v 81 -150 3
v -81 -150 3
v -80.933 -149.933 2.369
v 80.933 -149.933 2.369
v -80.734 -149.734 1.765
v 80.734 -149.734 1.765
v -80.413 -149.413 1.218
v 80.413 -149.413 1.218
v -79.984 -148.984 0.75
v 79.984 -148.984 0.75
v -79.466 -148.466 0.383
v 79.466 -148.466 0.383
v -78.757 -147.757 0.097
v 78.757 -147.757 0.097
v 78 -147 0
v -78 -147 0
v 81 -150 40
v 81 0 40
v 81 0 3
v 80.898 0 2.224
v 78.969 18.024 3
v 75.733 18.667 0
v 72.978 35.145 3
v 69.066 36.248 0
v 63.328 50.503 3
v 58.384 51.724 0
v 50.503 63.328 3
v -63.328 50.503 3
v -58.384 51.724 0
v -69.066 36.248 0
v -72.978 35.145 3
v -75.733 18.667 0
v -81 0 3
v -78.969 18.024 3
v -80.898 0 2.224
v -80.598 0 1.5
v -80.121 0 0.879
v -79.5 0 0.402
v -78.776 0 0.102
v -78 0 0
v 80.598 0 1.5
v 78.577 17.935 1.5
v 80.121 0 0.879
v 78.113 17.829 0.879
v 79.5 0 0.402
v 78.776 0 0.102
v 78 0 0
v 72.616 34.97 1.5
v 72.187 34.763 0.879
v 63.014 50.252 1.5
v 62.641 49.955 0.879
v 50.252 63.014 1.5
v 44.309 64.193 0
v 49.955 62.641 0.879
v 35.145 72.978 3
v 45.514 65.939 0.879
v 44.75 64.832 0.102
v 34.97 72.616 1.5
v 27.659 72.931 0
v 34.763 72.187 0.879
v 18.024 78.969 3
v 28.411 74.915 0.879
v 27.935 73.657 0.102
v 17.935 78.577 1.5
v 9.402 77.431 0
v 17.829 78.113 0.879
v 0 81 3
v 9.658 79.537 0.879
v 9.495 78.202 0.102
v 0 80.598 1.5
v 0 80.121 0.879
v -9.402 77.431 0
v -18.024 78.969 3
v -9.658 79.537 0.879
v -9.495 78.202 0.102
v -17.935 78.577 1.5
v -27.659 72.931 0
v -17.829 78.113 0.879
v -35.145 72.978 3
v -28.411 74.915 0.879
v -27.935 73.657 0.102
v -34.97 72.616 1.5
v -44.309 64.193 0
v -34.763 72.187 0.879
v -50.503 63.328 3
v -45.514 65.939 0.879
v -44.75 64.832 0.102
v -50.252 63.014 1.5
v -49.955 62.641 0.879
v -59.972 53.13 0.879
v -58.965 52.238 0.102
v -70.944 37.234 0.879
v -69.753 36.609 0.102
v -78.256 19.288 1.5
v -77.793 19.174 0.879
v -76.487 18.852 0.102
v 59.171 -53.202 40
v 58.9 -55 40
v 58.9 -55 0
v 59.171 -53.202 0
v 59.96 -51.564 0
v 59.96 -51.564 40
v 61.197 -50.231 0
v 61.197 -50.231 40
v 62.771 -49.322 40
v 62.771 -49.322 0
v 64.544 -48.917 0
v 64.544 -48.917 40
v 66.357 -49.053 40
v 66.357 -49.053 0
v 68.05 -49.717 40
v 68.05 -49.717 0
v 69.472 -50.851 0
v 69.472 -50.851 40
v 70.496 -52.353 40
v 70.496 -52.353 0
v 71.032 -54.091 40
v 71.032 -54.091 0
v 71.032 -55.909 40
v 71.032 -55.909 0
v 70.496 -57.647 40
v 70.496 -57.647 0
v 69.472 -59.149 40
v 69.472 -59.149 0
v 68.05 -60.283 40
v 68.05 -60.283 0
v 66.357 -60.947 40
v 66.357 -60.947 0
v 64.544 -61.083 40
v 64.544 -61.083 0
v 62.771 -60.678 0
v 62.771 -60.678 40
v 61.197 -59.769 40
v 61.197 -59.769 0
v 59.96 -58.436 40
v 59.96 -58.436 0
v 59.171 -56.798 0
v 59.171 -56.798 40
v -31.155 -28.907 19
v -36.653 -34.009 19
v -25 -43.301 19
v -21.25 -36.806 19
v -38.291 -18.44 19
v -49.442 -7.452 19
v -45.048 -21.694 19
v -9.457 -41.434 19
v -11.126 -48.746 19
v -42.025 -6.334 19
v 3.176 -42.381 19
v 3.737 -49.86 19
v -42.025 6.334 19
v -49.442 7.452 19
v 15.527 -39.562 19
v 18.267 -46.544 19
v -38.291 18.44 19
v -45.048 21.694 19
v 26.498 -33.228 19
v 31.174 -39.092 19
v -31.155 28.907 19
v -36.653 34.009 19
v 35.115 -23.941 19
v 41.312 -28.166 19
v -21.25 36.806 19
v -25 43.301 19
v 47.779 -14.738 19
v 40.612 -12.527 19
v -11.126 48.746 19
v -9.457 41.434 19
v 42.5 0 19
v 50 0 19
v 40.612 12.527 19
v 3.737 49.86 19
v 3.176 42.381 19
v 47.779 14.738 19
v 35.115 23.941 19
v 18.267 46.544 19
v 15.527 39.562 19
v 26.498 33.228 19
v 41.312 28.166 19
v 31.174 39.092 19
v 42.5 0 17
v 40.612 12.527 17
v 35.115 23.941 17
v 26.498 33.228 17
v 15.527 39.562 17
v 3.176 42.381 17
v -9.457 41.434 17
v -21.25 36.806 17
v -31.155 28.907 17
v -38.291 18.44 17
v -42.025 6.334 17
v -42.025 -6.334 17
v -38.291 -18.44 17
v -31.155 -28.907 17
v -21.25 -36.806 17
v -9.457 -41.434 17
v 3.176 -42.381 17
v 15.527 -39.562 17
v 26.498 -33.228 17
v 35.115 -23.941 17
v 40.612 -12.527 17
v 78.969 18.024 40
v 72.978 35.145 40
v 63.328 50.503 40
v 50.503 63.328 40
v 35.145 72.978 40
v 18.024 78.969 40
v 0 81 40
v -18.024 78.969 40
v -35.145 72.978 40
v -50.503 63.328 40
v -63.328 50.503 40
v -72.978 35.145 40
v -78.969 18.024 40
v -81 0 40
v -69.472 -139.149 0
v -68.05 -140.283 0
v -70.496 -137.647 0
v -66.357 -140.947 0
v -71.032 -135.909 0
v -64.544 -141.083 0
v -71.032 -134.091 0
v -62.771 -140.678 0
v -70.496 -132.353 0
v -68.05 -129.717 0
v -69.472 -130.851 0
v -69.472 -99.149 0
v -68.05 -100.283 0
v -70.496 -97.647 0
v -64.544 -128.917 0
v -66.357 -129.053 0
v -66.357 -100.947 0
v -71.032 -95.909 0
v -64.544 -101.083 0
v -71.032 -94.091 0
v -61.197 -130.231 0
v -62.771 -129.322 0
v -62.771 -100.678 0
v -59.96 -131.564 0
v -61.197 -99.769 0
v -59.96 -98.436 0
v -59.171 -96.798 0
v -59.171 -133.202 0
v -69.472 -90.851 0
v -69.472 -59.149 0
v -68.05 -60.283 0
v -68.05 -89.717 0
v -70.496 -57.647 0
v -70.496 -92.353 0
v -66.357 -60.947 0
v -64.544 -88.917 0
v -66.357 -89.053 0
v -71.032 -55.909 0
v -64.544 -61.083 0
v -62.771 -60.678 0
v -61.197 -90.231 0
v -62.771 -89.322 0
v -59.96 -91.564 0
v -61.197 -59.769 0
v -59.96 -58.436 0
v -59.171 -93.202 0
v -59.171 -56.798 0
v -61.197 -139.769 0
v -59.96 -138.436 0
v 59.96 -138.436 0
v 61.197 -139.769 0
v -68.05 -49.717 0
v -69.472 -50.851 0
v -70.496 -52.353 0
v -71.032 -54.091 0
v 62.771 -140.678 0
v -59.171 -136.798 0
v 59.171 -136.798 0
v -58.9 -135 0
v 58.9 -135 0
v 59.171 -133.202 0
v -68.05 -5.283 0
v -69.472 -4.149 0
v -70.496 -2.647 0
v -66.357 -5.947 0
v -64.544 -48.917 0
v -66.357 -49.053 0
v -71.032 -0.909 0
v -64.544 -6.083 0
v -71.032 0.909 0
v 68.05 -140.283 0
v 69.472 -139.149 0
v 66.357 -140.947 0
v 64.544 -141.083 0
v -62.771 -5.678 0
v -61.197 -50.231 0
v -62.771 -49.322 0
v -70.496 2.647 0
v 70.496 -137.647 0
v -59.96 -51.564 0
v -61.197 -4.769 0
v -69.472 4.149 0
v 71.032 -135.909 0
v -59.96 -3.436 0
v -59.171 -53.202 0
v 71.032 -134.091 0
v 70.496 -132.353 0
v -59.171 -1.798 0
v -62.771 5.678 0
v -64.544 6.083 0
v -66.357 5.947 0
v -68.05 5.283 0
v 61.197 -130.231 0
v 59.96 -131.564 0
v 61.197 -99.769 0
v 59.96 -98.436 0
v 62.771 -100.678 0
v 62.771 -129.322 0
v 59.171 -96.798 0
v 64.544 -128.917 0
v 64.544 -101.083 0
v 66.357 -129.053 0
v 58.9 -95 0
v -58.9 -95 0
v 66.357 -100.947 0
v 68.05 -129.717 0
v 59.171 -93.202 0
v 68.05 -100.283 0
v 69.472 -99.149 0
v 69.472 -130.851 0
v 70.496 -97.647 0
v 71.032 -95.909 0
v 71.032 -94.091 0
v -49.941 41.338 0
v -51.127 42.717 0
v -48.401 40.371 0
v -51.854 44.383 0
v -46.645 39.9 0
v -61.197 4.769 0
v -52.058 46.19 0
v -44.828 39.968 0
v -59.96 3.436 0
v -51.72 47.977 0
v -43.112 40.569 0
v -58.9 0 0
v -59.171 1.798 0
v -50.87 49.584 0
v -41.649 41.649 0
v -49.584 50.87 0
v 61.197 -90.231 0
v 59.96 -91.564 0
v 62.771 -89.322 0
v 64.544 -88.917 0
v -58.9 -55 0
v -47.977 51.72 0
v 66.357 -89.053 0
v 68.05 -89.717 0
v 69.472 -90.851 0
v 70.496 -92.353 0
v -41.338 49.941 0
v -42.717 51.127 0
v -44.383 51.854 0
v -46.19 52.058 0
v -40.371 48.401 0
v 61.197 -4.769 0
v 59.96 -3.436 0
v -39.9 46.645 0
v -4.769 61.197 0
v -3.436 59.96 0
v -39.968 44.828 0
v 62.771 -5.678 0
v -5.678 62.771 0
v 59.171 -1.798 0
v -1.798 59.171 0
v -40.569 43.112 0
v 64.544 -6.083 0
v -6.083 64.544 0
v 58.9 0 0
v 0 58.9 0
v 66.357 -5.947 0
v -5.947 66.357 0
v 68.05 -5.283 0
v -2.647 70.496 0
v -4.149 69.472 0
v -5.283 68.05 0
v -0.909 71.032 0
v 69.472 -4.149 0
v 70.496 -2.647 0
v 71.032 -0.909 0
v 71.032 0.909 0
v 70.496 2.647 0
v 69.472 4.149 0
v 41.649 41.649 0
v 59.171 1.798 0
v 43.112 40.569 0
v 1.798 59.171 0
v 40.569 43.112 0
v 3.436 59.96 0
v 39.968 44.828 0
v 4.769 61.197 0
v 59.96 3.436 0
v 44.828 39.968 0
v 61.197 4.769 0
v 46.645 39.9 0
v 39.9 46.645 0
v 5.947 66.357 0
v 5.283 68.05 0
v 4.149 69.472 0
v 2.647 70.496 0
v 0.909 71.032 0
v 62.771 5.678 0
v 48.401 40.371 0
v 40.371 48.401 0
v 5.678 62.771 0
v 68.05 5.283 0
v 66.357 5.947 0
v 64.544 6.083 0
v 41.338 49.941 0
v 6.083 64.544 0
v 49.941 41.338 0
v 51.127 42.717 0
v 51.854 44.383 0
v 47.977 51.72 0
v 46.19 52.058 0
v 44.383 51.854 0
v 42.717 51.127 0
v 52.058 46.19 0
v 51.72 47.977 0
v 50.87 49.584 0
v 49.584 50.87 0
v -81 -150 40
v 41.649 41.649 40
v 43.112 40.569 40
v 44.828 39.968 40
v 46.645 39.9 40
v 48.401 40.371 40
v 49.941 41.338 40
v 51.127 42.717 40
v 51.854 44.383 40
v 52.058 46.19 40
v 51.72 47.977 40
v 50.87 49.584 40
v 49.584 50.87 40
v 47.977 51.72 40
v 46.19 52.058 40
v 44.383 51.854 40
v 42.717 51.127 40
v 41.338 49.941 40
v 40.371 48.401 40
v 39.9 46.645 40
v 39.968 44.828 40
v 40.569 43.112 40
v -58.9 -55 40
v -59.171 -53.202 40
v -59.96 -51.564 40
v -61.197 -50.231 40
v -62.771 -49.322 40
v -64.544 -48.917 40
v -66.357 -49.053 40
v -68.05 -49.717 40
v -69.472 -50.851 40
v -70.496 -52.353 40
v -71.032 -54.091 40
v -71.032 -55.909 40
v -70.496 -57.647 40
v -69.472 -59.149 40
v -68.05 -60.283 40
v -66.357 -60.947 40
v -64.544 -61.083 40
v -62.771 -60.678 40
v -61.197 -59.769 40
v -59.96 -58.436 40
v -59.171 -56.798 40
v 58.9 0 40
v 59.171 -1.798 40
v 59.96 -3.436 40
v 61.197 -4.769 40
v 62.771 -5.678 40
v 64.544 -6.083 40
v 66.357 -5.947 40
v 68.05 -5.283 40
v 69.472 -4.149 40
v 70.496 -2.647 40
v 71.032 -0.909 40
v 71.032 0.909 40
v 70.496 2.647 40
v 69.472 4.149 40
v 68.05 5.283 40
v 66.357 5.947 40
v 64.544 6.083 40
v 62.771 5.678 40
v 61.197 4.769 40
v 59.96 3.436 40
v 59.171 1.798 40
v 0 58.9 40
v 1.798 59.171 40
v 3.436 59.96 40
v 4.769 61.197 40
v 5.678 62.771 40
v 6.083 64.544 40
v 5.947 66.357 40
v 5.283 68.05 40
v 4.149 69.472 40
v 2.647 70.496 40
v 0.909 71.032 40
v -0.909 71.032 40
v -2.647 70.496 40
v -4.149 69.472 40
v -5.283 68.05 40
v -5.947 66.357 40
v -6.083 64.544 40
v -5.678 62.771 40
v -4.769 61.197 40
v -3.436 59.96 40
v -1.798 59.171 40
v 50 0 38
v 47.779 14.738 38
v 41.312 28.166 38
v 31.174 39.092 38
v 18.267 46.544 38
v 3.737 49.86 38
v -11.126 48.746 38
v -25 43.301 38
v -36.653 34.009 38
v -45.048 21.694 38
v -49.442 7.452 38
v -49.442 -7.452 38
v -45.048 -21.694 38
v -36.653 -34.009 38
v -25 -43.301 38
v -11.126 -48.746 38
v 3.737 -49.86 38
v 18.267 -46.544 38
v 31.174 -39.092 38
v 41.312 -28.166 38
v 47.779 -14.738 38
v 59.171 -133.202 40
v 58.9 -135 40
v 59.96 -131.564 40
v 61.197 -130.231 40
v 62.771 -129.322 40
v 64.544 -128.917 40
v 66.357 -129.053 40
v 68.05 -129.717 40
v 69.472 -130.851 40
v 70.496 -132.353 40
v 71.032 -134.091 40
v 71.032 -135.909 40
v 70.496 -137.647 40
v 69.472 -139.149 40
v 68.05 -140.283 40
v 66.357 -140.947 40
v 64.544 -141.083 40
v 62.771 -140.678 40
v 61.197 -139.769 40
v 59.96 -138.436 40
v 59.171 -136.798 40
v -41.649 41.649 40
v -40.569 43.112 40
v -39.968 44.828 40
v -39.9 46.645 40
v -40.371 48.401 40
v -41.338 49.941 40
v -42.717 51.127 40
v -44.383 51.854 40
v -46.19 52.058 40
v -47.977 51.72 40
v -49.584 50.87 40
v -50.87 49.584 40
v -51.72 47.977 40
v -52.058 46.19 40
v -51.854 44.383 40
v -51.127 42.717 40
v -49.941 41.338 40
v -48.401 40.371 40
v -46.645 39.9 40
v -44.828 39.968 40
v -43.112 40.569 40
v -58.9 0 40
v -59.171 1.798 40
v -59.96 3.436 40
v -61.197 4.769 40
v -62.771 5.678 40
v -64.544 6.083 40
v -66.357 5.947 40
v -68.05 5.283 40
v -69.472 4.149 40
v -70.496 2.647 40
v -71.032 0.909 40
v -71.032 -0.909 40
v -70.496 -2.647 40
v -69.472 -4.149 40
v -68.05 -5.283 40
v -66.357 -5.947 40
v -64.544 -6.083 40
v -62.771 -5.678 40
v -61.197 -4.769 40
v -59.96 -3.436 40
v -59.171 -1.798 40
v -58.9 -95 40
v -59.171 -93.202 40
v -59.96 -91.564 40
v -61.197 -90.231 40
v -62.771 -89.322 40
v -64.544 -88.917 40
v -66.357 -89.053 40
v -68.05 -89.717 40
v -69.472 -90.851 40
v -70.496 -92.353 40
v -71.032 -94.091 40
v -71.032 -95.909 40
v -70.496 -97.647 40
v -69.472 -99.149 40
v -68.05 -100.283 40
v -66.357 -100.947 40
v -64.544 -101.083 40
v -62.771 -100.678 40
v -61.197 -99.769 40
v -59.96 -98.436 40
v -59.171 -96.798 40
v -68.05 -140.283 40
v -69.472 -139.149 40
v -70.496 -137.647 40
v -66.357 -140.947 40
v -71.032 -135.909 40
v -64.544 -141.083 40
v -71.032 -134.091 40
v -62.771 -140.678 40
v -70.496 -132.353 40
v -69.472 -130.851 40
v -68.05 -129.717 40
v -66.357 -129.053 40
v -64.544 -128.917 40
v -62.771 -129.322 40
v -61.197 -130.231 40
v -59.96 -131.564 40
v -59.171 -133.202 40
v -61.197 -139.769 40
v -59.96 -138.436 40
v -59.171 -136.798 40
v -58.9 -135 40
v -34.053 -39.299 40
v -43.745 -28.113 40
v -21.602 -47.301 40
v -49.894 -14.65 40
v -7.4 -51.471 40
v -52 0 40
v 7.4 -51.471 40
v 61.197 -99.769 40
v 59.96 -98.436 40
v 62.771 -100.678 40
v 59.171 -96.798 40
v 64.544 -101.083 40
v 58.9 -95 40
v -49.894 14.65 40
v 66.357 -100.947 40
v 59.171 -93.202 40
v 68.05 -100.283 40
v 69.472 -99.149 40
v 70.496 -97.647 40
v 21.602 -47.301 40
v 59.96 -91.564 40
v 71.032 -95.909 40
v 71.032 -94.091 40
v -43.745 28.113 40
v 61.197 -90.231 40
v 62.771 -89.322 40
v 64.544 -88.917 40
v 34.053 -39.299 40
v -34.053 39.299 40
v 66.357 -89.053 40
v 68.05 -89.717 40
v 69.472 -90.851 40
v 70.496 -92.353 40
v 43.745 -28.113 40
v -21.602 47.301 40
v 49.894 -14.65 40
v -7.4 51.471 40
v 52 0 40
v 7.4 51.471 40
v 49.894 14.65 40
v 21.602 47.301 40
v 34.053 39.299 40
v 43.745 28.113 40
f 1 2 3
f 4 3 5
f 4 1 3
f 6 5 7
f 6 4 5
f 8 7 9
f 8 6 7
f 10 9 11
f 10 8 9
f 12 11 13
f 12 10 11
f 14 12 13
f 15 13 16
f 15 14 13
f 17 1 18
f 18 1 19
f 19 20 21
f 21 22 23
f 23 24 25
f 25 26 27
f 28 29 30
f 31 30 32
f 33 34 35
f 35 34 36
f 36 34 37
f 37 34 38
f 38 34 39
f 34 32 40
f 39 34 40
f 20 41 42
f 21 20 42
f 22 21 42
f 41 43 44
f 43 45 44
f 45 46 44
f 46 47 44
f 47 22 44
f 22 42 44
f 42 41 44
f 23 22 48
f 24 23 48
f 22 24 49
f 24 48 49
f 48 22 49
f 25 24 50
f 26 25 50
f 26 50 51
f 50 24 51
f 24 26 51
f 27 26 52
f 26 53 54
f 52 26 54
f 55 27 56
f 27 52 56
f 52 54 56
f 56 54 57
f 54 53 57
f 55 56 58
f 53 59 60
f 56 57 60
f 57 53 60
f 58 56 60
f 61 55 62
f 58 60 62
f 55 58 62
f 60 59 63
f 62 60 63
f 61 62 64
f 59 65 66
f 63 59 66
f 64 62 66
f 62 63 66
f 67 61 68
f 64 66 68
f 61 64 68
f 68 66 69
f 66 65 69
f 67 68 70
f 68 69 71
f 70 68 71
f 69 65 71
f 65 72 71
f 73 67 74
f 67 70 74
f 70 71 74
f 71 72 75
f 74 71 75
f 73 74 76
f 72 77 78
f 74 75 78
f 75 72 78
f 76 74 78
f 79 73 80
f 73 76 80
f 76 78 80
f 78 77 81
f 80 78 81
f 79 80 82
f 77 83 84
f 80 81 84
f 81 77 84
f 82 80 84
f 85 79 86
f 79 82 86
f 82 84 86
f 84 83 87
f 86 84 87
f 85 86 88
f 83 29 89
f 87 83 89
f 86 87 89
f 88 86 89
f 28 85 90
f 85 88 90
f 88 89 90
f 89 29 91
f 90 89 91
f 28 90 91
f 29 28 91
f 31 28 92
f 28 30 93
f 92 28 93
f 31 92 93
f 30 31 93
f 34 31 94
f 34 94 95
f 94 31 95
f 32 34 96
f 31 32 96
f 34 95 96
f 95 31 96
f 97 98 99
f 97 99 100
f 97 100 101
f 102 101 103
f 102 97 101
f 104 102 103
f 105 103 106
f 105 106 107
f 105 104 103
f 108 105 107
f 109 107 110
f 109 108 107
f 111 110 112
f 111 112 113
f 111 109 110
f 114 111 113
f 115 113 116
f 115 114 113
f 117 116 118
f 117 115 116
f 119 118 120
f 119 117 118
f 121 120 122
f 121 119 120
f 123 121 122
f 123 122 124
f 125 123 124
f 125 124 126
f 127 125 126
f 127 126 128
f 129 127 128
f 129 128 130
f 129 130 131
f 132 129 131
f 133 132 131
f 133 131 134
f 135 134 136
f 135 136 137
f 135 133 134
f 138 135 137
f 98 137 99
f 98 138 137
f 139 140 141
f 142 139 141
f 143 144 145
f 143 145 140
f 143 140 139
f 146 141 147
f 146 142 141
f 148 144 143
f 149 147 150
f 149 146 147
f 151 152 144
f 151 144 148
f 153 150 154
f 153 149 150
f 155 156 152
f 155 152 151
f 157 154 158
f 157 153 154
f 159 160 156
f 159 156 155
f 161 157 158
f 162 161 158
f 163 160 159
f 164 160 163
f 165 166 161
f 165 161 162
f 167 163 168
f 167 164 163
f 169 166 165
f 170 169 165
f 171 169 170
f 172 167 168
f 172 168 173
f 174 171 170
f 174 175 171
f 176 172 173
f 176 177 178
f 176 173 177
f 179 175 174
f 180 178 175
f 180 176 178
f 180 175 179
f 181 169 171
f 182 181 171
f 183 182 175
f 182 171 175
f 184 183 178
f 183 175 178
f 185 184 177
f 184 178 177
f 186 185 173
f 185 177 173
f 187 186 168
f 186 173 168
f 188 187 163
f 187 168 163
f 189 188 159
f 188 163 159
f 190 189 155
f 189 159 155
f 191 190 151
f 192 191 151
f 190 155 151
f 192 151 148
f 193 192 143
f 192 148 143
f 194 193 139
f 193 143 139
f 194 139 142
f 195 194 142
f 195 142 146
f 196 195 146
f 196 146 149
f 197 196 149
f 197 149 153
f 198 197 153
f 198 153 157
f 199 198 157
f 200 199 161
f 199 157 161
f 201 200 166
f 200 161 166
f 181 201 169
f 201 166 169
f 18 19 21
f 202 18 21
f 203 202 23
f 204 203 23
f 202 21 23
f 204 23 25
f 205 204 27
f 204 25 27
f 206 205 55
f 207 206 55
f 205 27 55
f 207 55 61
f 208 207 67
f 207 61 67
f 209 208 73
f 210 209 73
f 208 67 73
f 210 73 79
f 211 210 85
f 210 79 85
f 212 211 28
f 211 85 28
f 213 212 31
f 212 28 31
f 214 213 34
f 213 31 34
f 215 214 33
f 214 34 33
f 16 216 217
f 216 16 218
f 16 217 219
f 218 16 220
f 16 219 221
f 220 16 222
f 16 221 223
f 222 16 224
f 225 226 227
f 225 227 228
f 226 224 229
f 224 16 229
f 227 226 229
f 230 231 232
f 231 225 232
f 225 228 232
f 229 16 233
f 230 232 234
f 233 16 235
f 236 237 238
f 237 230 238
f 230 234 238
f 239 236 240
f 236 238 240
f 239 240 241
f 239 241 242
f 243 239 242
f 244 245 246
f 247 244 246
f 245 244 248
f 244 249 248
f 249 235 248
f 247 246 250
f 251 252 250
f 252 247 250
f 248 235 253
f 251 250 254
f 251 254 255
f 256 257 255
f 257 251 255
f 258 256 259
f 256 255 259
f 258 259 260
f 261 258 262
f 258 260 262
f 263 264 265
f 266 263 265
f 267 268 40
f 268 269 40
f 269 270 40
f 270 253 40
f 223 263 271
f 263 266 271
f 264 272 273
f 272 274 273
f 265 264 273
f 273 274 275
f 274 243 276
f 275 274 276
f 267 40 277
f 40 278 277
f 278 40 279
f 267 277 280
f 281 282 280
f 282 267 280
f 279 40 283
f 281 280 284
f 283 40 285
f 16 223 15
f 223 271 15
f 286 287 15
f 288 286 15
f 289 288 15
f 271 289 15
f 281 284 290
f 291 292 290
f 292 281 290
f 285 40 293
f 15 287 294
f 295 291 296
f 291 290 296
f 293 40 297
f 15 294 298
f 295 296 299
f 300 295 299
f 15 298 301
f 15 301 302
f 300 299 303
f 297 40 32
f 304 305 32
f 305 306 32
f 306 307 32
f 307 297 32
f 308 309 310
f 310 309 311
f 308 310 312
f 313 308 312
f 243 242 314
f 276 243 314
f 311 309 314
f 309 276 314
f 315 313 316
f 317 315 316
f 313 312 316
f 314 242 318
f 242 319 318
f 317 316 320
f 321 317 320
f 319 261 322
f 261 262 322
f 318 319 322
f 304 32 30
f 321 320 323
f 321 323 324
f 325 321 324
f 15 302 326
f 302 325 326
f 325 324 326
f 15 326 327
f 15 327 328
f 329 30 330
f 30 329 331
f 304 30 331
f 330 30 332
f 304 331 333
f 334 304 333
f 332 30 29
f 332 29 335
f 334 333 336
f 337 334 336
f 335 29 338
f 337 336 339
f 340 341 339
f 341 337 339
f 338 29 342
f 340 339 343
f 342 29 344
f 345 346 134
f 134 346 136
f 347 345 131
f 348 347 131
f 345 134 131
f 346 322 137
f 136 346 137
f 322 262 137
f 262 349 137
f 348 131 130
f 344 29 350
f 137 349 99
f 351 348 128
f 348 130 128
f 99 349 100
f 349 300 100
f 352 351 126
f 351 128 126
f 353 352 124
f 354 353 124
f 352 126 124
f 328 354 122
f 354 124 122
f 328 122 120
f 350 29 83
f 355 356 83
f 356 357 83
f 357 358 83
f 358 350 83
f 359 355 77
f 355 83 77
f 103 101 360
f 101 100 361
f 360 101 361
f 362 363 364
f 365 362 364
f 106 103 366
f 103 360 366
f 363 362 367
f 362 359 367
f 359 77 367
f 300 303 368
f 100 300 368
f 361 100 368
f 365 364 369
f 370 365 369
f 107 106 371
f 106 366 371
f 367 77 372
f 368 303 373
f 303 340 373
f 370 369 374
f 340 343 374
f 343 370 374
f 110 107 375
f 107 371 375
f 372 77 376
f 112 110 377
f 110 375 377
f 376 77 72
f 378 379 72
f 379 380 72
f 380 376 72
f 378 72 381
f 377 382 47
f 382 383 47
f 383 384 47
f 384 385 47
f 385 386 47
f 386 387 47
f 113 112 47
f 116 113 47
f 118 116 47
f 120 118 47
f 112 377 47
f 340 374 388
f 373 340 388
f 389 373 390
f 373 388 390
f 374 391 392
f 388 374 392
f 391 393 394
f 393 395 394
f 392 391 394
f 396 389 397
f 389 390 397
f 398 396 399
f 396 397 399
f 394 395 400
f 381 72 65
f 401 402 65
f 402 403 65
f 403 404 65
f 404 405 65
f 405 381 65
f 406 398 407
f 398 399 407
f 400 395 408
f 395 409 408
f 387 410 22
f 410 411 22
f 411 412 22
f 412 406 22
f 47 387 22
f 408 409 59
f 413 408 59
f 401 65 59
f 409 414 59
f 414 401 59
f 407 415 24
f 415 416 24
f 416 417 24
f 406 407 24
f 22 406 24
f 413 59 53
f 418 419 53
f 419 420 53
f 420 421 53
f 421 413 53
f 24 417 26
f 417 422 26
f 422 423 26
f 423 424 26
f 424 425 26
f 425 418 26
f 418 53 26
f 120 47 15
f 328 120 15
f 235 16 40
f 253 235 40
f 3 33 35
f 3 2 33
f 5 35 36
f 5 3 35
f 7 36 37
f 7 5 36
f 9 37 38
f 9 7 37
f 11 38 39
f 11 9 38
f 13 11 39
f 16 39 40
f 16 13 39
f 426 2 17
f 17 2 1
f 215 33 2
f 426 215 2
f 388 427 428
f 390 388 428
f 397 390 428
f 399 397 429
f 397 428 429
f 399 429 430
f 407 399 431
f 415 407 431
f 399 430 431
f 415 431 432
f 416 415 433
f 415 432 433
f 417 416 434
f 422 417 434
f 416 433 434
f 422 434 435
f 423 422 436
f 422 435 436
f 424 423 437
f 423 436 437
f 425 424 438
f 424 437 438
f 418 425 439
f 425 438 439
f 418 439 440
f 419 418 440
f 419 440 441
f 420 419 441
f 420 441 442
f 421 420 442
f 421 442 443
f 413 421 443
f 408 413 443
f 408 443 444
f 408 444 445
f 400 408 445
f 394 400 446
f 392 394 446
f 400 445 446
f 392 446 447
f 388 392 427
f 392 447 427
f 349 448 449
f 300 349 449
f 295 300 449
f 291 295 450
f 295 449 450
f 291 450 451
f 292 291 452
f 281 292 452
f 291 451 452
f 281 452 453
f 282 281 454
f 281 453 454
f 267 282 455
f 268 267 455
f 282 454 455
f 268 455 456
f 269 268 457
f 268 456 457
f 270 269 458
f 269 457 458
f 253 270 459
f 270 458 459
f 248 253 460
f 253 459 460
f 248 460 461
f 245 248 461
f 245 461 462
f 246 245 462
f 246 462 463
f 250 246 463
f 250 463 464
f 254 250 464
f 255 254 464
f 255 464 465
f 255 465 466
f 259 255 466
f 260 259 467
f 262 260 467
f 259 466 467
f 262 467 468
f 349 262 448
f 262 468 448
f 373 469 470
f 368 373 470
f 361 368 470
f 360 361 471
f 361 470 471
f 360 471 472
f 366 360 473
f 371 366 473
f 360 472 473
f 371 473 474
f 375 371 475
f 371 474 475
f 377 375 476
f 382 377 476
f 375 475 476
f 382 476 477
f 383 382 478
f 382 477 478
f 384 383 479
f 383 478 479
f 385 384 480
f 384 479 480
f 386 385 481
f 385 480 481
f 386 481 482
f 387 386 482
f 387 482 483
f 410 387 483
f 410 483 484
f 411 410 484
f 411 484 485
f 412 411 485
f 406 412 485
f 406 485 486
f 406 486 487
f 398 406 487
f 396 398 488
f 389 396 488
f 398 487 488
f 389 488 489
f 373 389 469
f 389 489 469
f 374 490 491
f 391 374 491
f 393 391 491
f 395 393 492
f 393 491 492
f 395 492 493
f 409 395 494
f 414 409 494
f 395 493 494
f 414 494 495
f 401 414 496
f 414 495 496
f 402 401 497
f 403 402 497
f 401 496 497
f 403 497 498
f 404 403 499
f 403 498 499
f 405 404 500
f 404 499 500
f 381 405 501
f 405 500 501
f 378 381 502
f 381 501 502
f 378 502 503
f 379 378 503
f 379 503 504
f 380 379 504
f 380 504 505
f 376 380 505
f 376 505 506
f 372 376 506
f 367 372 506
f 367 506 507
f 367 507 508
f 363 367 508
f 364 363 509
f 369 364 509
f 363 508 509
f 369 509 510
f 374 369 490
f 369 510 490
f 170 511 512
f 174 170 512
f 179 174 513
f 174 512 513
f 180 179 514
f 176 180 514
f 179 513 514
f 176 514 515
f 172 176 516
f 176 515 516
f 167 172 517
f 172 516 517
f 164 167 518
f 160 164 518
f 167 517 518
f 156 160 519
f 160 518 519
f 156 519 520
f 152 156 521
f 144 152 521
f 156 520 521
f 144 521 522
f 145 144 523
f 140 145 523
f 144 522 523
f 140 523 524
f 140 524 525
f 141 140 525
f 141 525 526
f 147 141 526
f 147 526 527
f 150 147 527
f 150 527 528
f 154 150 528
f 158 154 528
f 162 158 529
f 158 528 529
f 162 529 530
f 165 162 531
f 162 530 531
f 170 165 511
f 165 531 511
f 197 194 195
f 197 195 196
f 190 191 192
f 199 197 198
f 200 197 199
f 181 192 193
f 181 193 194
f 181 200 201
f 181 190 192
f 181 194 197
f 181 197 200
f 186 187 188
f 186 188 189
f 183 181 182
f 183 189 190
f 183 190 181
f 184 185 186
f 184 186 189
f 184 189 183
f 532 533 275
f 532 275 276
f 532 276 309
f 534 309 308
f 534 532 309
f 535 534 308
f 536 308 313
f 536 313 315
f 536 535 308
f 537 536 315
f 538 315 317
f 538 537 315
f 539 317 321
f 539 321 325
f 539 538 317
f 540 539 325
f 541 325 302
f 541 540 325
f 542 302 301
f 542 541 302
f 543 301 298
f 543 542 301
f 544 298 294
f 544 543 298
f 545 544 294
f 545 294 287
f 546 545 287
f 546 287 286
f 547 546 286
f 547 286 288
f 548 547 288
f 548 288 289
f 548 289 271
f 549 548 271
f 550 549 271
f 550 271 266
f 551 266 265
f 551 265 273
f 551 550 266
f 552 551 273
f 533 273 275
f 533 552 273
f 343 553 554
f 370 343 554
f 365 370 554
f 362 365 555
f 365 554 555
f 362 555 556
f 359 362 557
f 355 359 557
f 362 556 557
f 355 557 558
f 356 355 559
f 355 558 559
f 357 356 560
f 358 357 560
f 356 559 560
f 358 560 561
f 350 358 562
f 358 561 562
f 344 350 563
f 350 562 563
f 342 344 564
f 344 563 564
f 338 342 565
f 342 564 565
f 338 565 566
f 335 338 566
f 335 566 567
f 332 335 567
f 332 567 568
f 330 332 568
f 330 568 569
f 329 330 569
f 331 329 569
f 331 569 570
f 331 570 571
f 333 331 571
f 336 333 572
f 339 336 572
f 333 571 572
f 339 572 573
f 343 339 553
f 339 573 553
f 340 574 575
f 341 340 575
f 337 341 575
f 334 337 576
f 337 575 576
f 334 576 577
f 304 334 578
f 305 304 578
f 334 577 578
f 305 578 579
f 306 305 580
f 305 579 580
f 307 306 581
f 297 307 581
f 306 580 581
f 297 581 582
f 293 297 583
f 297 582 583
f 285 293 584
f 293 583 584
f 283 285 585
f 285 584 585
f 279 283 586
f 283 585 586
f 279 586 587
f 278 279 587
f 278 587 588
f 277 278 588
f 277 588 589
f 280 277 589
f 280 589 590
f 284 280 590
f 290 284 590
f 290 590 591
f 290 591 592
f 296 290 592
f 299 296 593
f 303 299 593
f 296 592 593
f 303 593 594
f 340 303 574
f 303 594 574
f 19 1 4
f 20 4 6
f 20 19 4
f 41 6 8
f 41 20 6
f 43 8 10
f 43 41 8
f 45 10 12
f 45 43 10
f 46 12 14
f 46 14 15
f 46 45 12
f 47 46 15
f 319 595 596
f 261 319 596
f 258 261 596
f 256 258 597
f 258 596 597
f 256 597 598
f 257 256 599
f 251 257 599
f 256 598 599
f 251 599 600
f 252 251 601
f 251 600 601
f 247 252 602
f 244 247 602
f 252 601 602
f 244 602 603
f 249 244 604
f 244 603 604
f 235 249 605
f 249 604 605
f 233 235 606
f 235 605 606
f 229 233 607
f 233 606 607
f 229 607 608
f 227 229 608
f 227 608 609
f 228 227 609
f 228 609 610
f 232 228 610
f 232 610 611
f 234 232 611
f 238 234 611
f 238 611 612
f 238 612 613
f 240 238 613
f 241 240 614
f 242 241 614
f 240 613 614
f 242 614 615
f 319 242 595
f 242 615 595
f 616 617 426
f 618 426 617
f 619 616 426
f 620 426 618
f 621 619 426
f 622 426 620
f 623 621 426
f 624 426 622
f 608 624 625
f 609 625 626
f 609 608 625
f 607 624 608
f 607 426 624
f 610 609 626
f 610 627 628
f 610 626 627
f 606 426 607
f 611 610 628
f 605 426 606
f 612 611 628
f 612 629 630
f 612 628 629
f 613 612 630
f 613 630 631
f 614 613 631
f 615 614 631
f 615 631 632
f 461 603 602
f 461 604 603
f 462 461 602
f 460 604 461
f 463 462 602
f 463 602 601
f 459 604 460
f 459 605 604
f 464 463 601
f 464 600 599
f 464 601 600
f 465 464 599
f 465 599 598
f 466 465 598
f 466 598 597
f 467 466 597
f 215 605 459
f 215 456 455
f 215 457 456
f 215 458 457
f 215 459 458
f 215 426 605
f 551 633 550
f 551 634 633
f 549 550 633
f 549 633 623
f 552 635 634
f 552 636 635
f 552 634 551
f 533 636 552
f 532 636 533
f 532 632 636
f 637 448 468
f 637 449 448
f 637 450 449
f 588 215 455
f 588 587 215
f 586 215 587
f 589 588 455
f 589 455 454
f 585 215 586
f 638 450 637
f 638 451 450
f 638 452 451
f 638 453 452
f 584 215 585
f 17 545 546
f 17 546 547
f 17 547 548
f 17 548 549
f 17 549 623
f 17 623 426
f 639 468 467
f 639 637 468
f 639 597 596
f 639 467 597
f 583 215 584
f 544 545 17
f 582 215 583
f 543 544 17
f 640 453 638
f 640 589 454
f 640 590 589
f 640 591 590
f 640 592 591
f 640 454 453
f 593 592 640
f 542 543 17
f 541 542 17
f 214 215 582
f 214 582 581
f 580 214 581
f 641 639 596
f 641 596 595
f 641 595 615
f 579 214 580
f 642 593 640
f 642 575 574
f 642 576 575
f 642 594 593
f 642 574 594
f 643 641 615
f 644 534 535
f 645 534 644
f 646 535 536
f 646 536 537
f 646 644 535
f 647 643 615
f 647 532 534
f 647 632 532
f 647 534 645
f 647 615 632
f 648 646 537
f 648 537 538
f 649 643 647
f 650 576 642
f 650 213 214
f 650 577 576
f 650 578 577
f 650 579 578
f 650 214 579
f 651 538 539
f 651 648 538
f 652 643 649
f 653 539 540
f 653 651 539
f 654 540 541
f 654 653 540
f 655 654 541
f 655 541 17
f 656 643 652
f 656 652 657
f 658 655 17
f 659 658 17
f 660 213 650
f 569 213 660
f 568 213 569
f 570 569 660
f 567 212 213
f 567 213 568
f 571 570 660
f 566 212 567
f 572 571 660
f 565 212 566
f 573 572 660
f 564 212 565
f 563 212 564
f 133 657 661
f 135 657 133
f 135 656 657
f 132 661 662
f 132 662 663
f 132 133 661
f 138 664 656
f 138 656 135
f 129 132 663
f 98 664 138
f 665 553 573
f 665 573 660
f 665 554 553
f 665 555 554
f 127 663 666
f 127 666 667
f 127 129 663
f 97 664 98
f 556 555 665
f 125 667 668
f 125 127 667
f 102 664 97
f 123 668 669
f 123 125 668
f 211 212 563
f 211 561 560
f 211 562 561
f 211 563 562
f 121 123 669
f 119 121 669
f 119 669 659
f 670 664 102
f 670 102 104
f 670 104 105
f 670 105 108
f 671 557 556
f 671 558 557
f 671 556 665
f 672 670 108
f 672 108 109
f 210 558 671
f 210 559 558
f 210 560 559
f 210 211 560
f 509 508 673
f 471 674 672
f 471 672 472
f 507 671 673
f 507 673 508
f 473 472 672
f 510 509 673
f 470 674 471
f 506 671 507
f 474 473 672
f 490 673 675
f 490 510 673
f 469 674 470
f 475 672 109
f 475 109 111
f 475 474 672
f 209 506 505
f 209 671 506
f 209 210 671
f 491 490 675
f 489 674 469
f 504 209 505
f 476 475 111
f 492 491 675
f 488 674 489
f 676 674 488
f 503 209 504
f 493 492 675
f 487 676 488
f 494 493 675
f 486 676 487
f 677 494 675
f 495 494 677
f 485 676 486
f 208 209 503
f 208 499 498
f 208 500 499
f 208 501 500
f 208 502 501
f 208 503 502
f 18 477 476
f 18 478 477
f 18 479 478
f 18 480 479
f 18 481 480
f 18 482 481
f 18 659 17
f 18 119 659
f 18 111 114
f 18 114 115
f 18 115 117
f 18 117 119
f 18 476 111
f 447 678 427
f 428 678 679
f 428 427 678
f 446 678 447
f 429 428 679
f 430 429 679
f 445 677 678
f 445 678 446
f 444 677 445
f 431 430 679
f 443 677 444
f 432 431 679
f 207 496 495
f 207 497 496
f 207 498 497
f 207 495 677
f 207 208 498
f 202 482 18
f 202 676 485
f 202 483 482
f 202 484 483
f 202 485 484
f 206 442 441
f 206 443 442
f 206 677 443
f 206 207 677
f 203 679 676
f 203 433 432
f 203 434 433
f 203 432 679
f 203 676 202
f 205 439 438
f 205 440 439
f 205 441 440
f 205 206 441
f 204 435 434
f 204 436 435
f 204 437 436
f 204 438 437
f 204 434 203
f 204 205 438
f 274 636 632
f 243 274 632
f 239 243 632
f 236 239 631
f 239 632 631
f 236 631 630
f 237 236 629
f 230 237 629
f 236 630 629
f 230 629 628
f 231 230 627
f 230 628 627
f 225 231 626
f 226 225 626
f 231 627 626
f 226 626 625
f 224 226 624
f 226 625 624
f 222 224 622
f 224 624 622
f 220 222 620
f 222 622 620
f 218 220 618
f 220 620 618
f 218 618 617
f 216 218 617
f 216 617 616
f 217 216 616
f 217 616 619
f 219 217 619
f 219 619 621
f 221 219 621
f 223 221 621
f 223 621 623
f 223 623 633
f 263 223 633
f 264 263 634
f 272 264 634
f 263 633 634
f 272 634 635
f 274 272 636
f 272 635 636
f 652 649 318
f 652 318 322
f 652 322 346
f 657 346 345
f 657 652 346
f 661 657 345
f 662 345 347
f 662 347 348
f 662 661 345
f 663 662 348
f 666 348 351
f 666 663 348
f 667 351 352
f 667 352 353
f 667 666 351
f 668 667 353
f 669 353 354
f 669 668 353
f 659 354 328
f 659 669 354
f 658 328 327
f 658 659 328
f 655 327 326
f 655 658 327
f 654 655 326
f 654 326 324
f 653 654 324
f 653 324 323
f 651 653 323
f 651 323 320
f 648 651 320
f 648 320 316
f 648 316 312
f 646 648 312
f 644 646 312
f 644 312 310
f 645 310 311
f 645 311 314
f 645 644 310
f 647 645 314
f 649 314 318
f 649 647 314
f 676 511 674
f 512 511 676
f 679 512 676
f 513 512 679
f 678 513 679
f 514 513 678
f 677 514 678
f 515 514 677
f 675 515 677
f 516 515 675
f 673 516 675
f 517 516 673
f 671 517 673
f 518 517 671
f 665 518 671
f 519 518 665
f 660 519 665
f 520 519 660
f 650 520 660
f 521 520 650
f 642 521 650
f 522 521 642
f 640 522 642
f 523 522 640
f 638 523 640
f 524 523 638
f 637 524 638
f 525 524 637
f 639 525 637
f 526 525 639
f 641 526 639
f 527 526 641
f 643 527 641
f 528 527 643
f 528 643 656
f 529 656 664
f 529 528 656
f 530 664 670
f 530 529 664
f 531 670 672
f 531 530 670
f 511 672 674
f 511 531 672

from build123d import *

# Parameters (mm, degrees)
BOSS_EXTRUDE1_DEPTH = 40
SKETCH2_R           = 6.1
CUT_EXTRUDE1_DEPTH  = 40
CIRPATTERN1_COUNT   = 5
CIRPATTERN1_ANGLE   = 180
SKETCH3_R           = 6.1
CUT_EXTRUDE2_DEPTH  = 40
SKETCH5_R           = 50
CUT_EXTRUDE3_DEPTH  = 21
SKETCH6_R           = 42.5
CUT_EXTRUDE4_DEPTH  = 2
CHAMFER1_SIZE       = 2
FILLET1_R           = 3


with BuildPart() as part:
    # Sketch1 → Boss-Extrude1 (new body)
    with BuildSketch(Plane.XY):
        with BuildLine():
            Line((-81, 0), (-81, -150))
            Line((-81, -150), (81, -150))
            Line((81, -150), (81, 0))
            ThreePointArc((81, 0), (0, 81), (-81, 0))
        make_face()
    extrude(amount=BOSS_EXTRUDE1_DEPTH)

    # Sketch2 → Cut-Extrude1 (cut)
    with BuildSketch(Plane.XY.offset(40)):
        with Locations((-65, 0)):
            Circle(SKETCH2_R)
    cut_extrude1 = extrude(amount=-CUT_EXTRUDE1_DEPTH, mode=Mode.SUBTRACT)

    # CirPattern1: Cut-Extrude1 ×5 about axis
    cirpattern1_axis = Axis((0, 0, 0), (0, 0, -1))
    for i in range(1, CIRPATTERN1_COUNT):
        add(cut_extrude1.rotate(cirpattern1_axis, i * CIRPATTERN1_ANGLE / (CIRPATTERN1_COUNT - 1)), mode=Mode.SUBTRACT)

    # Sketch3 → Cut-Extrude2 (cut)
    with BuildSketch(Plane.XY.offset(40)):
        with Locations((-65, -135)):
            Circle(SKETCH3_R)
        with Locations((-65, -95)):
            Circle(SKETCH3_R)
        with Locations((-65, -55)):
            Circle(SKETCH3_R)
    cut_extrude2 = extrude(amount=-CUT_EXTRUDE2_DEPTH, mode=Mode.SUBTRACT)

    # Mirror1: Cut-Extrude2 across plane
    add(cut_extrude2.mirror(Plane(origin=(0, 0, 0), x_dir=(0, 0, 1), z_dir=(1, 0, 0))), mode=Mode.SUBTRACT)

    # Sketch5 → Cut-Extrude3 (cut)
    with BuildSketch(Plane.XY.offset(40)):
        Circle(SKETCH5_R)
    extrude(amount=-CUT_EXTRUDE3_DEPTH, mode=Mode.SUBTRACT)

    # Sketch6 → Cut-Extrude4 (cut)
    with BuildSketch(Plane.XY.offset(19)):
        Circle(SKETCH6_R)
    extrude(amount=-CUT_EXTRUDE4_DEPTH, mode=Mode.SUBTRACT)

    # Chamfer1
    chamfer1_edges = [part.edges().sort_by_distance(p)[0] for p in [
        (-50, 0, 40),
    ]]
    chamfer(chamfer1_edges, length=CHAMFER1_SIZE)

    # Fillet1
    fillet1_edges = [part.edges().sort_by_distance(p)[0] for p in [
        (81, -75, 0),
        (0, -150, 0),
        (-81, -75, 0),
        (0, 81, 0),
    ]]
    fillet(fillet1_edges, radius=FILLET1_R)


solid = part.part
